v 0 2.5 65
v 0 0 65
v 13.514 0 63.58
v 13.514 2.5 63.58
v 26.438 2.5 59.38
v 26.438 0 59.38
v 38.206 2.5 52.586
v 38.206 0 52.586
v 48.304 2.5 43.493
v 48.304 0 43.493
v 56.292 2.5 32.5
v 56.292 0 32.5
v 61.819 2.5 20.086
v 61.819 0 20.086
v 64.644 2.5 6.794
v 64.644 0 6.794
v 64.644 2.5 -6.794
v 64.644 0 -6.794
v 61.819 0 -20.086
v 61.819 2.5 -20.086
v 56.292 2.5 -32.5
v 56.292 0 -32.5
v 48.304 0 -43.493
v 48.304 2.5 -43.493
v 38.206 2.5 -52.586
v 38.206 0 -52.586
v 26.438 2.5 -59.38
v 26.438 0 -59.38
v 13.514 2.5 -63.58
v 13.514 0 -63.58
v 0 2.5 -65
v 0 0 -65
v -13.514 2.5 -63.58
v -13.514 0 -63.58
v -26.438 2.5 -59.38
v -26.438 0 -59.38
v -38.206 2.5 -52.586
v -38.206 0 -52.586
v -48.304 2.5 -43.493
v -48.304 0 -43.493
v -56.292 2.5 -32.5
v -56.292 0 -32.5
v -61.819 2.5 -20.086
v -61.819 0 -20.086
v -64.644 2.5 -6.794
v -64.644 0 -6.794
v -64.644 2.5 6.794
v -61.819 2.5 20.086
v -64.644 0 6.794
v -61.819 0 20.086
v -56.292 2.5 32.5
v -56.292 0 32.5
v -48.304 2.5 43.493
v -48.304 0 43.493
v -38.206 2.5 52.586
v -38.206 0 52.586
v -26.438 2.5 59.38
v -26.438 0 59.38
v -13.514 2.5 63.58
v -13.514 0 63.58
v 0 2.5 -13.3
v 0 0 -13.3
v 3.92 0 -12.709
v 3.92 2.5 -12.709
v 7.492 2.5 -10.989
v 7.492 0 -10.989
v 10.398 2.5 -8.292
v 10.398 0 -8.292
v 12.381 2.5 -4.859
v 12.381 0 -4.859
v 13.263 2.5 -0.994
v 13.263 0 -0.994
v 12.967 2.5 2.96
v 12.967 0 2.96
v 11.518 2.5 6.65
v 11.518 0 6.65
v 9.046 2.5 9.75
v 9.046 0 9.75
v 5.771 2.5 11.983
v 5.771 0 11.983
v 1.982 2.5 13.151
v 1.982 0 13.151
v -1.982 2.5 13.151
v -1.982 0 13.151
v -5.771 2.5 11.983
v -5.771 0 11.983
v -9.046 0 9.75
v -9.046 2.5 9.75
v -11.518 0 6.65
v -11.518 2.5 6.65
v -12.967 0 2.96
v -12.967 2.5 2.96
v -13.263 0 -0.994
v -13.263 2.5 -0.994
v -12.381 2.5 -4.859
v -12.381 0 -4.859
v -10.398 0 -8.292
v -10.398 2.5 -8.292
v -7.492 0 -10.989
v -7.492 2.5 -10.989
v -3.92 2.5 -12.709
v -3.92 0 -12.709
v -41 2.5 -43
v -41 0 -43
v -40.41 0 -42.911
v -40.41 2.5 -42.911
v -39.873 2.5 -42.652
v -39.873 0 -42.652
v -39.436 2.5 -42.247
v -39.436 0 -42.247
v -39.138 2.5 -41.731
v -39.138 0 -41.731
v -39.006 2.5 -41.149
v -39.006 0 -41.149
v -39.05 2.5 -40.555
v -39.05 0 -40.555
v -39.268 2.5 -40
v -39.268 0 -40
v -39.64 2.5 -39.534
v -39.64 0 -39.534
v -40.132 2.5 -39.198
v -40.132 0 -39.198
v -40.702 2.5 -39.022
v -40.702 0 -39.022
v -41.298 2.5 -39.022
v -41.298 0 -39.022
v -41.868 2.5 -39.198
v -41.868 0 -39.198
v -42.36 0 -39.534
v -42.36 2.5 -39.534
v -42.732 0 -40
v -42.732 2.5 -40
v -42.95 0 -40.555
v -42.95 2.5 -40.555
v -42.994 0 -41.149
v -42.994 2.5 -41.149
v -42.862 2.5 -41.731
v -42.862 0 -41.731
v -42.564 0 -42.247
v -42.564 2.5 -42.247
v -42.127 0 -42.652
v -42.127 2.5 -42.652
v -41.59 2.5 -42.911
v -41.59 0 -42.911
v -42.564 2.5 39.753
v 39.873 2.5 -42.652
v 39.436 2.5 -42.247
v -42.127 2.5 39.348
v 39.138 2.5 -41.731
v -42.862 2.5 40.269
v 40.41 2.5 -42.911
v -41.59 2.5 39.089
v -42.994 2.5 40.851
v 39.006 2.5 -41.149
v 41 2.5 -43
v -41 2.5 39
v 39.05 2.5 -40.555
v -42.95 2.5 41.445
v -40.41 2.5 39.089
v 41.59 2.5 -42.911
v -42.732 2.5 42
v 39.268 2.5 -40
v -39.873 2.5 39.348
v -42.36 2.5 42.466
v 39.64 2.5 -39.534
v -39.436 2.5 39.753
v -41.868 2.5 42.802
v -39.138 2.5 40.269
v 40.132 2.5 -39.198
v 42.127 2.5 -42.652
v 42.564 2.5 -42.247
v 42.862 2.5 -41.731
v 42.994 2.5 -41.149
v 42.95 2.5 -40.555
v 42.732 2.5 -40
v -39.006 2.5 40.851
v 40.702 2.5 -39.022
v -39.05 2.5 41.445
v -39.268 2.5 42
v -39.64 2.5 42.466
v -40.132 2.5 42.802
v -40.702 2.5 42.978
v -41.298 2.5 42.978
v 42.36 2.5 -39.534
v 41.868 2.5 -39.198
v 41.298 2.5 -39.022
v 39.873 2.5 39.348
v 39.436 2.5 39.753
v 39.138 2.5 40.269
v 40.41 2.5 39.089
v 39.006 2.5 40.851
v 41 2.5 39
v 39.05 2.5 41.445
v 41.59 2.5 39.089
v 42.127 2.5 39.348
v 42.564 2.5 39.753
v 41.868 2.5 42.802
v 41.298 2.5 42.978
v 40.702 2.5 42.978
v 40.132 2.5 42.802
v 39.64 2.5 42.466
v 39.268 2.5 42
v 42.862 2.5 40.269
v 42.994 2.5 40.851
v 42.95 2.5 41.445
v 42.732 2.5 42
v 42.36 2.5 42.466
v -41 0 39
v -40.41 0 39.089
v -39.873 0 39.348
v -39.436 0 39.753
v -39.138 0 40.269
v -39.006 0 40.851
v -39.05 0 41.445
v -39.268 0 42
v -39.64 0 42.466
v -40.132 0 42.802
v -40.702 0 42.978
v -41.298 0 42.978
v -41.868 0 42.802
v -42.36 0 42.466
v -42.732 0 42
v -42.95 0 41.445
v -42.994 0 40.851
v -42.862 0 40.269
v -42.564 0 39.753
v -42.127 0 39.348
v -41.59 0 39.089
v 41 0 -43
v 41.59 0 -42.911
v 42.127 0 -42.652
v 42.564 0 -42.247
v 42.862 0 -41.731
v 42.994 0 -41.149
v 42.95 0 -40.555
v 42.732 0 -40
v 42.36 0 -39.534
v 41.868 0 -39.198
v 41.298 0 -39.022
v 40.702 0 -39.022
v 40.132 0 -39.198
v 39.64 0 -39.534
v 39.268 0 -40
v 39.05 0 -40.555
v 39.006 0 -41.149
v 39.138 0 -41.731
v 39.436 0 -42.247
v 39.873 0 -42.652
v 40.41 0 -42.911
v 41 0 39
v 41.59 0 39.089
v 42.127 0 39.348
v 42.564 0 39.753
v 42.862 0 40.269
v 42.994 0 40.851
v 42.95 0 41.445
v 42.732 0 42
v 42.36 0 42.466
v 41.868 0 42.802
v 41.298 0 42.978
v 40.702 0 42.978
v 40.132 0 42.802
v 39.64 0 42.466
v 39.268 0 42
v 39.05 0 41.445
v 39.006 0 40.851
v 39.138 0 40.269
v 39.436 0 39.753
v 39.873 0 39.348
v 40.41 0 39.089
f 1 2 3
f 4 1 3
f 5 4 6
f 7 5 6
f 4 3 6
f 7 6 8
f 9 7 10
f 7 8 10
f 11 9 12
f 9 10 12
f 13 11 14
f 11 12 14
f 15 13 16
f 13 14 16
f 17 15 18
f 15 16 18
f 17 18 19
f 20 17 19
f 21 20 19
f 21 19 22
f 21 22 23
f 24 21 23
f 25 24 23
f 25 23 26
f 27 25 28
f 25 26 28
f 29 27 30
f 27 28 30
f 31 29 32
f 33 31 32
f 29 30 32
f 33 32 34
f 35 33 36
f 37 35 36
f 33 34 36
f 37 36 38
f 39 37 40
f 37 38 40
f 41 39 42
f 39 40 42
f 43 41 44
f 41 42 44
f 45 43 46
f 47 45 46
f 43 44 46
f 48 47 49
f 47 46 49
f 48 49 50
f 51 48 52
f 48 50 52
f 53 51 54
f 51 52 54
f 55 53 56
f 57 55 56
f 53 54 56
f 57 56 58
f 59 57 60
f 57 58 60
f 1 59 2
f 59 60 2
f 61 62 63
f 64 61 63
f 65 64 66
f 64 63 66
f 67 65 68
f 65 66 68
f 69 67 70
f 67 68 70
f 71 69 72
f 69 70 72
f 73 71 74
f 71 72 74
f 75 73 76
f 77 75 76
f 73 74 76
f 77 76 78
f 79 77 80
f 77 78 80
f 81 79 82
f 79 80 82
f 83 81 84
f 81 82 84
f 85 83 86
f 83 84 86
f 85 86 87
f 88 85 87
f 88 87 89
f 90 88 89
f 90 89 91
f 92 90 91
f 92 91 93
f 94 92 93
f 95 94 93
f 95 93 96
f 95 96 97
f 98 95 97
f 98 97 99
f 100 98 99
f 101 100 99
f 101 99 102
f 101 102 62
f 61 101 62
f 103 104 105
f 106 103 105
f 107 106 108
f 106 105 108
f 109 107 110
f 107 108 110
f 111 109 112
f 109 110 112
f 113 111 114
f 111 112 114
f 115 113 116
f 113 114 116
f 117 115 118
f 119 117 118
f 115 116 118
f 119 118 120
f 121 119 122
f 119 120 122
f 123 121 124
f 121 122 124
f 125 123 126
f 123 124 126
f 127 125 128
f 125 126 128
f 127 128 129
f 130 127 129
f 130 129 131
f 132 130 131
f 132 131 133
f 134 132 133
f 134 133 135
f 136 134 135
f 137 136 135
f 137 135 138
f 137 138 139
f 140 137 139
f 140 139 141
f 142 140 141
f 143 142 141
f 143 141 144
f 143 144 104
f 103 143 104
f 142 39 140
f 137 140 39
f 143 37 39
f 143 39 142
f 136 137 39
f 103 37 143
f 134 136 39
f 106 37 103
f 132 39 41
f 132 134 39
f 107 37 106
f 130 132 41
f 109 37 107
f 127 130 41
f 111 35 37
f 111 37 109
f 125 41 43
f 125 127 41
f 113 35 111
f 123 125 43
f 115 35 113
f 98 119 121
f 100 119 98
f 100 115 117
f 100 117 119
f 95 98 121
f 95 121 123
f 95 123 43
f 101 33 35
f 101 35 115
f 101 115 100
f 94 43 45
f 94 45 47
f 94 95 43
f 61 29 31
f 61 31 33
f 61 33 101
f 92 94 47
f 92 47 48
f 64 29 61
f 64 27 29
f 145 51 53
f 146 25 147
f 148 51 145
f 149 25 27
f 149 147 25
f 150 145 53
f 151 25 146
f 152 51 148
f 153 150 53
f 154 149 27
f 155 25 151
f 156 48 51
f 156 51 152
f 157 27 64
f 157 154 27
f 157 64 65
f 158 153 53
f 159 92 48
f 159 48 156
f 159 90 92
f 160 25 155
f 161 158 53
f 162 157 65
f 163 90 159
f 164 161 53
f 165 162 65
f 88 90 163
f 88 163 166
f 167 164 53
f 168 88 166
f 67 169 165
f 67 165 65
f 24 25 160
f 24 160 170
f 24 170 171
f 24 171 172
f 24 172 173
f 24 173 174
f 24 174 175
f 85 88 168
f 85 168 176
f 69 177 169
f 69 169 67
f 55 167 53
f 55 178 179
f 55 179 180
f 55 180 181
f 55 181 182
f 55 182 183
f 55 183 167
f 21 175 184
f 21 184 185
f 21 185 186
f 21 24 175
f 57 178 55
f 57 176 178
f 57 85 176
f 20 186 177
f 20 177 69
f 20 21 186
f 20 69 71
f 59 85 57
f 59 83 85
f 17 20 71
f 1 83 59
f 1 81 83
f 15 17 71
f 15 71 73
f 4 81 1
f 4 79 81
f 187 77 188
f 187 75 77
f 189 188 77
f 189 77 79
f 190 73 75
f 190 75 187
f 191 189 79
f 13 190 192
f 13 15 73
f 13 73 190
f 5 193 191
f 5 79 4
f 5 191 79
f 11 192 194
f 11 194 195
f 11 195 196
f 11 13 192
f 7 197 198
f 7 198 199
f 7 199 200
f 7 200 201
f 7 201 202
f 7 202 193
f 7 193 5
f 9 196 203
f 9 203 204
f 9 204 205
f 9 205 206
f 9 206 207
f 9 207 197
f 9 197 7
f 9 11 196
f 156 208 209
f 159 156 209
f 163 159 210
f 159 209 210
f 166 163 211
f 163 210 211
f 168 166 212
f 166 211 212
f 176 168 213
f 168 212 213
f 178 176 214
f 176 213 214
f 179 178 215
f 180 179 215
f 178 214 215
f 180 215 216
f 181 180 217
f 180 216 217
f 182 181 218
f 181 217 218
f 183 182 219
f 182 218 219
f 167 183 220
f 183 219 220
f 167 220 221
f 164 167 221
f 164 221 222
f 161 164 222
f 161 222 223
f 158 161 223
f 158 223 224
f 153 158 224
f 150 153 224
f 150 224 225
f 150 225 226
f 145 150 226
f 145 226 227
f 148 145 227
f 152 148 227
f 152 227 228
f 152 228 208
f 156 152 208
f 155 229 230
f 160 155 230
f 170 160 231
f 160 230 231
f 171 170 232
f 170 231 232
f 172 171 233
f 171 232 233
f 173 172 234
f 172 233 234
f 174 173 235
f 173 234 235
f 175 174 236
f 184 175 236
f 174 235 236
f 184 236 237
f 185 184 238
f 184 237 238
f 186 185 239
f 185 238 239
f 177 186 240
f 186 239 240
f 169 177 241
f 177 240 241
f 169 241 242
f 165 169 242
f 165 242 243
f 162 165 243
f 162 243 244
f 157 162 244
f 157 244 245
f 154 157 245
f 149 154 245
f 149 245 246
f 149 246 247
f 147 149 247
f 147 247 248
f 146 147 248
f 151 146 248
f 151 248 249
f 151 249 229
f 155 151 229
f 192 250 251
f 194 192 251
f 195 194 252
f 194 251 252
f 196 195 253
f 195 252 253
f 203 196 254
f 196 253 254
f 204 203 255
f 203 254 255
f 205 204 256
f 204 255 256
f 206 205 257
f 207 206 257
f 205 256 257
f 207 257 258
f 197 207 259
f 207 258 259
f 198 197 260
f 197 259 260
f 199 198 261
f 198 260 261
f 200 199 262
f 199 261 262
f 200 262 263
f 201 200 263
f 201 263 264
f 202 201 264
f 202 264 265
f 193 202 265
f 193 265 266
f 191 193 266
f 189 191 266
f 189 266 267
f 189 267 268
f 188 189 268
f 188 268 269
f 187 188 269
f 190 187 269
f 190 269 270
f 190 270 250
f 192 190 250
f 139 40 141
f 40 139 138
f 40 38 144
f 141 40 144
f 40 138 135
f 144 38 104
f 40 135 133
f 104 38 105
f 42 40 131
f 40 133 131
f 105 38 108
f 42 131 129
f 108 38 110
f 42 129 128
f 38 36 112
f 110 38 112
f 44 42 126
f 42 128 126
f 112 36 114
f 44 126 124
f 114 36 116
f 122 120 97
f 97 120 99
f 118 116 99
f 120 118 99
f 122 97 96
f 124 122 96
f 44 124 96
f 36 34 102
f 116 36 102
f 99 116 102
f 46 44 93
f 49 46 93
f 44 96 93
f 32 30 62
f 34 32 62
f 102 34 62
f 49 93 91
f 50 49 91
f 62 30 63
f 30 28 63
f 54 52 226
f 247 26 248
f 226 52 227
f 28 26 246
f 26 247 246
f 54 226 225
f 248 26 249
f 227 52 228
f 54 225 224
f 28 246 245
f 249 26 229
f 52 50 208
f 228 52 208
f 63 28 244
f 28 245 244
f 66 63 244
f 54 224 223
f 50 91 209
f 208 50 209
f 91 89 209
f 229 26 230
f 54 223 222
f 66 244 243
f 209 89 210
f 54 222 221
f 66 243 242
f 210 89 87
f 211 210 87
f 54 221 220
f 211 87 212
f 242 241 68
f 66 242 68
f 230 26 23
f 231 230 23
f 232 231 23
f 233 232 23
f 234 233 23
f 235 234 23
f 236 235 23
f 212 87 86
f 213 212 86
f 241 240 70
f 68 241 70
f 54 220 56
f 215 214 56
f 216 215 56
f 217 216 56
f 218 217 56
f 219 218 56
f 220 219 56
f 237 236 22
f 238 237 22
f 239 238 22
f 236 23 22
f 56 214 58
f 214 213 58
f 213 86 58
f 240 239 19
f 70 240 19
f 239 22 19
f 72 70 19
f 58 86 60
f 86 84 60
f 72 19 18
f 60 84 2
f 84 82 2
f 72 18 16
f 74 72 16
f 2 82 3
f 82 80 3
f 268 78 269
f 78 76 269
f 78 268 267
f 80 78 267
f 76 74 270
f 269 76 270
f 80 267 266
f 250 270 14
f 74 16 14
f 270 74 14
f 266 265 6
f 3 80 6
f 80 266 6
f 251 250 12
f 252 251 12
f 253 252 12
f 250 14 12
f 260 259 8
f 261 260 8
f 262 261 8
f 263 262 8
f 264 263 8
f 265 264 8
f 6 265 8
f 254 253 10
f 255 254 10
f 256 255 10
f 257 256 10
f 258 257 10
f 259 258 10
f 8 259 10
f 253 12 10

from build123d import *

# Parameters (mm, degrees)
SKETCH1_R           = 65
BOSS_EXTRUDE1_DEPTH = 2.5
SKETCH2_R           = 13.3
CUT_EXTRUDE1_DEPTH  = 92.957870789
SKETCH3_R           = 2
CUT_EXTRUDE2_DEPTH  = 92.957870789


with BuildPart() as part:
    # Sketch1 → Boss-Extrude1 (new body)
    with BuildSketch(Plane(origin=(0, 0, 0), x_dir=(1, 0, 0), z_dir=(0, 1, 0))):
        with Locations(Location((0, 0, 0), (0, 0, 270))):
            Circle(SKETCH1_R)
    extrude(amount=BOSS_EXTRUDE1_DEPTH)

    # Sketch2 → Cut-Extrude1 (cut, through all)
    with BuildSketch(Plane.XZ):
        with Locations(Location((0, 0, 0), (0, 0, 270))):
            Circle(SKETCH2_R)
    extrude(amount=-CUT_EXTRUDE1_DEPTH, mode=Mode.SUBTRACT)

    # Sketch3 → Cut-Extrude2 (cut, through all)
    with BuildSketch(Plane.XZ):
        with Locations(Location((-41, 41, 0), (0, 0, 270))):
            Circle(SKETCH3_R)
        with Locations(Location((41, 41, 0), (0, 0, 270))):
            Circle(SKETCH3_R)
        with Locations(Location((41, -41, 0), (0, 0, 270))):
            Circle(SKETCH3_R)
        with Locations(Location((-41, -41, 0), (0, 0, 270))):
            Circle(SKETCH3_R)
    extrude(amount=-CUT_EXTRUDE2_DEPTH, mode=Mode.SUBTRACT)


solid = part.part
